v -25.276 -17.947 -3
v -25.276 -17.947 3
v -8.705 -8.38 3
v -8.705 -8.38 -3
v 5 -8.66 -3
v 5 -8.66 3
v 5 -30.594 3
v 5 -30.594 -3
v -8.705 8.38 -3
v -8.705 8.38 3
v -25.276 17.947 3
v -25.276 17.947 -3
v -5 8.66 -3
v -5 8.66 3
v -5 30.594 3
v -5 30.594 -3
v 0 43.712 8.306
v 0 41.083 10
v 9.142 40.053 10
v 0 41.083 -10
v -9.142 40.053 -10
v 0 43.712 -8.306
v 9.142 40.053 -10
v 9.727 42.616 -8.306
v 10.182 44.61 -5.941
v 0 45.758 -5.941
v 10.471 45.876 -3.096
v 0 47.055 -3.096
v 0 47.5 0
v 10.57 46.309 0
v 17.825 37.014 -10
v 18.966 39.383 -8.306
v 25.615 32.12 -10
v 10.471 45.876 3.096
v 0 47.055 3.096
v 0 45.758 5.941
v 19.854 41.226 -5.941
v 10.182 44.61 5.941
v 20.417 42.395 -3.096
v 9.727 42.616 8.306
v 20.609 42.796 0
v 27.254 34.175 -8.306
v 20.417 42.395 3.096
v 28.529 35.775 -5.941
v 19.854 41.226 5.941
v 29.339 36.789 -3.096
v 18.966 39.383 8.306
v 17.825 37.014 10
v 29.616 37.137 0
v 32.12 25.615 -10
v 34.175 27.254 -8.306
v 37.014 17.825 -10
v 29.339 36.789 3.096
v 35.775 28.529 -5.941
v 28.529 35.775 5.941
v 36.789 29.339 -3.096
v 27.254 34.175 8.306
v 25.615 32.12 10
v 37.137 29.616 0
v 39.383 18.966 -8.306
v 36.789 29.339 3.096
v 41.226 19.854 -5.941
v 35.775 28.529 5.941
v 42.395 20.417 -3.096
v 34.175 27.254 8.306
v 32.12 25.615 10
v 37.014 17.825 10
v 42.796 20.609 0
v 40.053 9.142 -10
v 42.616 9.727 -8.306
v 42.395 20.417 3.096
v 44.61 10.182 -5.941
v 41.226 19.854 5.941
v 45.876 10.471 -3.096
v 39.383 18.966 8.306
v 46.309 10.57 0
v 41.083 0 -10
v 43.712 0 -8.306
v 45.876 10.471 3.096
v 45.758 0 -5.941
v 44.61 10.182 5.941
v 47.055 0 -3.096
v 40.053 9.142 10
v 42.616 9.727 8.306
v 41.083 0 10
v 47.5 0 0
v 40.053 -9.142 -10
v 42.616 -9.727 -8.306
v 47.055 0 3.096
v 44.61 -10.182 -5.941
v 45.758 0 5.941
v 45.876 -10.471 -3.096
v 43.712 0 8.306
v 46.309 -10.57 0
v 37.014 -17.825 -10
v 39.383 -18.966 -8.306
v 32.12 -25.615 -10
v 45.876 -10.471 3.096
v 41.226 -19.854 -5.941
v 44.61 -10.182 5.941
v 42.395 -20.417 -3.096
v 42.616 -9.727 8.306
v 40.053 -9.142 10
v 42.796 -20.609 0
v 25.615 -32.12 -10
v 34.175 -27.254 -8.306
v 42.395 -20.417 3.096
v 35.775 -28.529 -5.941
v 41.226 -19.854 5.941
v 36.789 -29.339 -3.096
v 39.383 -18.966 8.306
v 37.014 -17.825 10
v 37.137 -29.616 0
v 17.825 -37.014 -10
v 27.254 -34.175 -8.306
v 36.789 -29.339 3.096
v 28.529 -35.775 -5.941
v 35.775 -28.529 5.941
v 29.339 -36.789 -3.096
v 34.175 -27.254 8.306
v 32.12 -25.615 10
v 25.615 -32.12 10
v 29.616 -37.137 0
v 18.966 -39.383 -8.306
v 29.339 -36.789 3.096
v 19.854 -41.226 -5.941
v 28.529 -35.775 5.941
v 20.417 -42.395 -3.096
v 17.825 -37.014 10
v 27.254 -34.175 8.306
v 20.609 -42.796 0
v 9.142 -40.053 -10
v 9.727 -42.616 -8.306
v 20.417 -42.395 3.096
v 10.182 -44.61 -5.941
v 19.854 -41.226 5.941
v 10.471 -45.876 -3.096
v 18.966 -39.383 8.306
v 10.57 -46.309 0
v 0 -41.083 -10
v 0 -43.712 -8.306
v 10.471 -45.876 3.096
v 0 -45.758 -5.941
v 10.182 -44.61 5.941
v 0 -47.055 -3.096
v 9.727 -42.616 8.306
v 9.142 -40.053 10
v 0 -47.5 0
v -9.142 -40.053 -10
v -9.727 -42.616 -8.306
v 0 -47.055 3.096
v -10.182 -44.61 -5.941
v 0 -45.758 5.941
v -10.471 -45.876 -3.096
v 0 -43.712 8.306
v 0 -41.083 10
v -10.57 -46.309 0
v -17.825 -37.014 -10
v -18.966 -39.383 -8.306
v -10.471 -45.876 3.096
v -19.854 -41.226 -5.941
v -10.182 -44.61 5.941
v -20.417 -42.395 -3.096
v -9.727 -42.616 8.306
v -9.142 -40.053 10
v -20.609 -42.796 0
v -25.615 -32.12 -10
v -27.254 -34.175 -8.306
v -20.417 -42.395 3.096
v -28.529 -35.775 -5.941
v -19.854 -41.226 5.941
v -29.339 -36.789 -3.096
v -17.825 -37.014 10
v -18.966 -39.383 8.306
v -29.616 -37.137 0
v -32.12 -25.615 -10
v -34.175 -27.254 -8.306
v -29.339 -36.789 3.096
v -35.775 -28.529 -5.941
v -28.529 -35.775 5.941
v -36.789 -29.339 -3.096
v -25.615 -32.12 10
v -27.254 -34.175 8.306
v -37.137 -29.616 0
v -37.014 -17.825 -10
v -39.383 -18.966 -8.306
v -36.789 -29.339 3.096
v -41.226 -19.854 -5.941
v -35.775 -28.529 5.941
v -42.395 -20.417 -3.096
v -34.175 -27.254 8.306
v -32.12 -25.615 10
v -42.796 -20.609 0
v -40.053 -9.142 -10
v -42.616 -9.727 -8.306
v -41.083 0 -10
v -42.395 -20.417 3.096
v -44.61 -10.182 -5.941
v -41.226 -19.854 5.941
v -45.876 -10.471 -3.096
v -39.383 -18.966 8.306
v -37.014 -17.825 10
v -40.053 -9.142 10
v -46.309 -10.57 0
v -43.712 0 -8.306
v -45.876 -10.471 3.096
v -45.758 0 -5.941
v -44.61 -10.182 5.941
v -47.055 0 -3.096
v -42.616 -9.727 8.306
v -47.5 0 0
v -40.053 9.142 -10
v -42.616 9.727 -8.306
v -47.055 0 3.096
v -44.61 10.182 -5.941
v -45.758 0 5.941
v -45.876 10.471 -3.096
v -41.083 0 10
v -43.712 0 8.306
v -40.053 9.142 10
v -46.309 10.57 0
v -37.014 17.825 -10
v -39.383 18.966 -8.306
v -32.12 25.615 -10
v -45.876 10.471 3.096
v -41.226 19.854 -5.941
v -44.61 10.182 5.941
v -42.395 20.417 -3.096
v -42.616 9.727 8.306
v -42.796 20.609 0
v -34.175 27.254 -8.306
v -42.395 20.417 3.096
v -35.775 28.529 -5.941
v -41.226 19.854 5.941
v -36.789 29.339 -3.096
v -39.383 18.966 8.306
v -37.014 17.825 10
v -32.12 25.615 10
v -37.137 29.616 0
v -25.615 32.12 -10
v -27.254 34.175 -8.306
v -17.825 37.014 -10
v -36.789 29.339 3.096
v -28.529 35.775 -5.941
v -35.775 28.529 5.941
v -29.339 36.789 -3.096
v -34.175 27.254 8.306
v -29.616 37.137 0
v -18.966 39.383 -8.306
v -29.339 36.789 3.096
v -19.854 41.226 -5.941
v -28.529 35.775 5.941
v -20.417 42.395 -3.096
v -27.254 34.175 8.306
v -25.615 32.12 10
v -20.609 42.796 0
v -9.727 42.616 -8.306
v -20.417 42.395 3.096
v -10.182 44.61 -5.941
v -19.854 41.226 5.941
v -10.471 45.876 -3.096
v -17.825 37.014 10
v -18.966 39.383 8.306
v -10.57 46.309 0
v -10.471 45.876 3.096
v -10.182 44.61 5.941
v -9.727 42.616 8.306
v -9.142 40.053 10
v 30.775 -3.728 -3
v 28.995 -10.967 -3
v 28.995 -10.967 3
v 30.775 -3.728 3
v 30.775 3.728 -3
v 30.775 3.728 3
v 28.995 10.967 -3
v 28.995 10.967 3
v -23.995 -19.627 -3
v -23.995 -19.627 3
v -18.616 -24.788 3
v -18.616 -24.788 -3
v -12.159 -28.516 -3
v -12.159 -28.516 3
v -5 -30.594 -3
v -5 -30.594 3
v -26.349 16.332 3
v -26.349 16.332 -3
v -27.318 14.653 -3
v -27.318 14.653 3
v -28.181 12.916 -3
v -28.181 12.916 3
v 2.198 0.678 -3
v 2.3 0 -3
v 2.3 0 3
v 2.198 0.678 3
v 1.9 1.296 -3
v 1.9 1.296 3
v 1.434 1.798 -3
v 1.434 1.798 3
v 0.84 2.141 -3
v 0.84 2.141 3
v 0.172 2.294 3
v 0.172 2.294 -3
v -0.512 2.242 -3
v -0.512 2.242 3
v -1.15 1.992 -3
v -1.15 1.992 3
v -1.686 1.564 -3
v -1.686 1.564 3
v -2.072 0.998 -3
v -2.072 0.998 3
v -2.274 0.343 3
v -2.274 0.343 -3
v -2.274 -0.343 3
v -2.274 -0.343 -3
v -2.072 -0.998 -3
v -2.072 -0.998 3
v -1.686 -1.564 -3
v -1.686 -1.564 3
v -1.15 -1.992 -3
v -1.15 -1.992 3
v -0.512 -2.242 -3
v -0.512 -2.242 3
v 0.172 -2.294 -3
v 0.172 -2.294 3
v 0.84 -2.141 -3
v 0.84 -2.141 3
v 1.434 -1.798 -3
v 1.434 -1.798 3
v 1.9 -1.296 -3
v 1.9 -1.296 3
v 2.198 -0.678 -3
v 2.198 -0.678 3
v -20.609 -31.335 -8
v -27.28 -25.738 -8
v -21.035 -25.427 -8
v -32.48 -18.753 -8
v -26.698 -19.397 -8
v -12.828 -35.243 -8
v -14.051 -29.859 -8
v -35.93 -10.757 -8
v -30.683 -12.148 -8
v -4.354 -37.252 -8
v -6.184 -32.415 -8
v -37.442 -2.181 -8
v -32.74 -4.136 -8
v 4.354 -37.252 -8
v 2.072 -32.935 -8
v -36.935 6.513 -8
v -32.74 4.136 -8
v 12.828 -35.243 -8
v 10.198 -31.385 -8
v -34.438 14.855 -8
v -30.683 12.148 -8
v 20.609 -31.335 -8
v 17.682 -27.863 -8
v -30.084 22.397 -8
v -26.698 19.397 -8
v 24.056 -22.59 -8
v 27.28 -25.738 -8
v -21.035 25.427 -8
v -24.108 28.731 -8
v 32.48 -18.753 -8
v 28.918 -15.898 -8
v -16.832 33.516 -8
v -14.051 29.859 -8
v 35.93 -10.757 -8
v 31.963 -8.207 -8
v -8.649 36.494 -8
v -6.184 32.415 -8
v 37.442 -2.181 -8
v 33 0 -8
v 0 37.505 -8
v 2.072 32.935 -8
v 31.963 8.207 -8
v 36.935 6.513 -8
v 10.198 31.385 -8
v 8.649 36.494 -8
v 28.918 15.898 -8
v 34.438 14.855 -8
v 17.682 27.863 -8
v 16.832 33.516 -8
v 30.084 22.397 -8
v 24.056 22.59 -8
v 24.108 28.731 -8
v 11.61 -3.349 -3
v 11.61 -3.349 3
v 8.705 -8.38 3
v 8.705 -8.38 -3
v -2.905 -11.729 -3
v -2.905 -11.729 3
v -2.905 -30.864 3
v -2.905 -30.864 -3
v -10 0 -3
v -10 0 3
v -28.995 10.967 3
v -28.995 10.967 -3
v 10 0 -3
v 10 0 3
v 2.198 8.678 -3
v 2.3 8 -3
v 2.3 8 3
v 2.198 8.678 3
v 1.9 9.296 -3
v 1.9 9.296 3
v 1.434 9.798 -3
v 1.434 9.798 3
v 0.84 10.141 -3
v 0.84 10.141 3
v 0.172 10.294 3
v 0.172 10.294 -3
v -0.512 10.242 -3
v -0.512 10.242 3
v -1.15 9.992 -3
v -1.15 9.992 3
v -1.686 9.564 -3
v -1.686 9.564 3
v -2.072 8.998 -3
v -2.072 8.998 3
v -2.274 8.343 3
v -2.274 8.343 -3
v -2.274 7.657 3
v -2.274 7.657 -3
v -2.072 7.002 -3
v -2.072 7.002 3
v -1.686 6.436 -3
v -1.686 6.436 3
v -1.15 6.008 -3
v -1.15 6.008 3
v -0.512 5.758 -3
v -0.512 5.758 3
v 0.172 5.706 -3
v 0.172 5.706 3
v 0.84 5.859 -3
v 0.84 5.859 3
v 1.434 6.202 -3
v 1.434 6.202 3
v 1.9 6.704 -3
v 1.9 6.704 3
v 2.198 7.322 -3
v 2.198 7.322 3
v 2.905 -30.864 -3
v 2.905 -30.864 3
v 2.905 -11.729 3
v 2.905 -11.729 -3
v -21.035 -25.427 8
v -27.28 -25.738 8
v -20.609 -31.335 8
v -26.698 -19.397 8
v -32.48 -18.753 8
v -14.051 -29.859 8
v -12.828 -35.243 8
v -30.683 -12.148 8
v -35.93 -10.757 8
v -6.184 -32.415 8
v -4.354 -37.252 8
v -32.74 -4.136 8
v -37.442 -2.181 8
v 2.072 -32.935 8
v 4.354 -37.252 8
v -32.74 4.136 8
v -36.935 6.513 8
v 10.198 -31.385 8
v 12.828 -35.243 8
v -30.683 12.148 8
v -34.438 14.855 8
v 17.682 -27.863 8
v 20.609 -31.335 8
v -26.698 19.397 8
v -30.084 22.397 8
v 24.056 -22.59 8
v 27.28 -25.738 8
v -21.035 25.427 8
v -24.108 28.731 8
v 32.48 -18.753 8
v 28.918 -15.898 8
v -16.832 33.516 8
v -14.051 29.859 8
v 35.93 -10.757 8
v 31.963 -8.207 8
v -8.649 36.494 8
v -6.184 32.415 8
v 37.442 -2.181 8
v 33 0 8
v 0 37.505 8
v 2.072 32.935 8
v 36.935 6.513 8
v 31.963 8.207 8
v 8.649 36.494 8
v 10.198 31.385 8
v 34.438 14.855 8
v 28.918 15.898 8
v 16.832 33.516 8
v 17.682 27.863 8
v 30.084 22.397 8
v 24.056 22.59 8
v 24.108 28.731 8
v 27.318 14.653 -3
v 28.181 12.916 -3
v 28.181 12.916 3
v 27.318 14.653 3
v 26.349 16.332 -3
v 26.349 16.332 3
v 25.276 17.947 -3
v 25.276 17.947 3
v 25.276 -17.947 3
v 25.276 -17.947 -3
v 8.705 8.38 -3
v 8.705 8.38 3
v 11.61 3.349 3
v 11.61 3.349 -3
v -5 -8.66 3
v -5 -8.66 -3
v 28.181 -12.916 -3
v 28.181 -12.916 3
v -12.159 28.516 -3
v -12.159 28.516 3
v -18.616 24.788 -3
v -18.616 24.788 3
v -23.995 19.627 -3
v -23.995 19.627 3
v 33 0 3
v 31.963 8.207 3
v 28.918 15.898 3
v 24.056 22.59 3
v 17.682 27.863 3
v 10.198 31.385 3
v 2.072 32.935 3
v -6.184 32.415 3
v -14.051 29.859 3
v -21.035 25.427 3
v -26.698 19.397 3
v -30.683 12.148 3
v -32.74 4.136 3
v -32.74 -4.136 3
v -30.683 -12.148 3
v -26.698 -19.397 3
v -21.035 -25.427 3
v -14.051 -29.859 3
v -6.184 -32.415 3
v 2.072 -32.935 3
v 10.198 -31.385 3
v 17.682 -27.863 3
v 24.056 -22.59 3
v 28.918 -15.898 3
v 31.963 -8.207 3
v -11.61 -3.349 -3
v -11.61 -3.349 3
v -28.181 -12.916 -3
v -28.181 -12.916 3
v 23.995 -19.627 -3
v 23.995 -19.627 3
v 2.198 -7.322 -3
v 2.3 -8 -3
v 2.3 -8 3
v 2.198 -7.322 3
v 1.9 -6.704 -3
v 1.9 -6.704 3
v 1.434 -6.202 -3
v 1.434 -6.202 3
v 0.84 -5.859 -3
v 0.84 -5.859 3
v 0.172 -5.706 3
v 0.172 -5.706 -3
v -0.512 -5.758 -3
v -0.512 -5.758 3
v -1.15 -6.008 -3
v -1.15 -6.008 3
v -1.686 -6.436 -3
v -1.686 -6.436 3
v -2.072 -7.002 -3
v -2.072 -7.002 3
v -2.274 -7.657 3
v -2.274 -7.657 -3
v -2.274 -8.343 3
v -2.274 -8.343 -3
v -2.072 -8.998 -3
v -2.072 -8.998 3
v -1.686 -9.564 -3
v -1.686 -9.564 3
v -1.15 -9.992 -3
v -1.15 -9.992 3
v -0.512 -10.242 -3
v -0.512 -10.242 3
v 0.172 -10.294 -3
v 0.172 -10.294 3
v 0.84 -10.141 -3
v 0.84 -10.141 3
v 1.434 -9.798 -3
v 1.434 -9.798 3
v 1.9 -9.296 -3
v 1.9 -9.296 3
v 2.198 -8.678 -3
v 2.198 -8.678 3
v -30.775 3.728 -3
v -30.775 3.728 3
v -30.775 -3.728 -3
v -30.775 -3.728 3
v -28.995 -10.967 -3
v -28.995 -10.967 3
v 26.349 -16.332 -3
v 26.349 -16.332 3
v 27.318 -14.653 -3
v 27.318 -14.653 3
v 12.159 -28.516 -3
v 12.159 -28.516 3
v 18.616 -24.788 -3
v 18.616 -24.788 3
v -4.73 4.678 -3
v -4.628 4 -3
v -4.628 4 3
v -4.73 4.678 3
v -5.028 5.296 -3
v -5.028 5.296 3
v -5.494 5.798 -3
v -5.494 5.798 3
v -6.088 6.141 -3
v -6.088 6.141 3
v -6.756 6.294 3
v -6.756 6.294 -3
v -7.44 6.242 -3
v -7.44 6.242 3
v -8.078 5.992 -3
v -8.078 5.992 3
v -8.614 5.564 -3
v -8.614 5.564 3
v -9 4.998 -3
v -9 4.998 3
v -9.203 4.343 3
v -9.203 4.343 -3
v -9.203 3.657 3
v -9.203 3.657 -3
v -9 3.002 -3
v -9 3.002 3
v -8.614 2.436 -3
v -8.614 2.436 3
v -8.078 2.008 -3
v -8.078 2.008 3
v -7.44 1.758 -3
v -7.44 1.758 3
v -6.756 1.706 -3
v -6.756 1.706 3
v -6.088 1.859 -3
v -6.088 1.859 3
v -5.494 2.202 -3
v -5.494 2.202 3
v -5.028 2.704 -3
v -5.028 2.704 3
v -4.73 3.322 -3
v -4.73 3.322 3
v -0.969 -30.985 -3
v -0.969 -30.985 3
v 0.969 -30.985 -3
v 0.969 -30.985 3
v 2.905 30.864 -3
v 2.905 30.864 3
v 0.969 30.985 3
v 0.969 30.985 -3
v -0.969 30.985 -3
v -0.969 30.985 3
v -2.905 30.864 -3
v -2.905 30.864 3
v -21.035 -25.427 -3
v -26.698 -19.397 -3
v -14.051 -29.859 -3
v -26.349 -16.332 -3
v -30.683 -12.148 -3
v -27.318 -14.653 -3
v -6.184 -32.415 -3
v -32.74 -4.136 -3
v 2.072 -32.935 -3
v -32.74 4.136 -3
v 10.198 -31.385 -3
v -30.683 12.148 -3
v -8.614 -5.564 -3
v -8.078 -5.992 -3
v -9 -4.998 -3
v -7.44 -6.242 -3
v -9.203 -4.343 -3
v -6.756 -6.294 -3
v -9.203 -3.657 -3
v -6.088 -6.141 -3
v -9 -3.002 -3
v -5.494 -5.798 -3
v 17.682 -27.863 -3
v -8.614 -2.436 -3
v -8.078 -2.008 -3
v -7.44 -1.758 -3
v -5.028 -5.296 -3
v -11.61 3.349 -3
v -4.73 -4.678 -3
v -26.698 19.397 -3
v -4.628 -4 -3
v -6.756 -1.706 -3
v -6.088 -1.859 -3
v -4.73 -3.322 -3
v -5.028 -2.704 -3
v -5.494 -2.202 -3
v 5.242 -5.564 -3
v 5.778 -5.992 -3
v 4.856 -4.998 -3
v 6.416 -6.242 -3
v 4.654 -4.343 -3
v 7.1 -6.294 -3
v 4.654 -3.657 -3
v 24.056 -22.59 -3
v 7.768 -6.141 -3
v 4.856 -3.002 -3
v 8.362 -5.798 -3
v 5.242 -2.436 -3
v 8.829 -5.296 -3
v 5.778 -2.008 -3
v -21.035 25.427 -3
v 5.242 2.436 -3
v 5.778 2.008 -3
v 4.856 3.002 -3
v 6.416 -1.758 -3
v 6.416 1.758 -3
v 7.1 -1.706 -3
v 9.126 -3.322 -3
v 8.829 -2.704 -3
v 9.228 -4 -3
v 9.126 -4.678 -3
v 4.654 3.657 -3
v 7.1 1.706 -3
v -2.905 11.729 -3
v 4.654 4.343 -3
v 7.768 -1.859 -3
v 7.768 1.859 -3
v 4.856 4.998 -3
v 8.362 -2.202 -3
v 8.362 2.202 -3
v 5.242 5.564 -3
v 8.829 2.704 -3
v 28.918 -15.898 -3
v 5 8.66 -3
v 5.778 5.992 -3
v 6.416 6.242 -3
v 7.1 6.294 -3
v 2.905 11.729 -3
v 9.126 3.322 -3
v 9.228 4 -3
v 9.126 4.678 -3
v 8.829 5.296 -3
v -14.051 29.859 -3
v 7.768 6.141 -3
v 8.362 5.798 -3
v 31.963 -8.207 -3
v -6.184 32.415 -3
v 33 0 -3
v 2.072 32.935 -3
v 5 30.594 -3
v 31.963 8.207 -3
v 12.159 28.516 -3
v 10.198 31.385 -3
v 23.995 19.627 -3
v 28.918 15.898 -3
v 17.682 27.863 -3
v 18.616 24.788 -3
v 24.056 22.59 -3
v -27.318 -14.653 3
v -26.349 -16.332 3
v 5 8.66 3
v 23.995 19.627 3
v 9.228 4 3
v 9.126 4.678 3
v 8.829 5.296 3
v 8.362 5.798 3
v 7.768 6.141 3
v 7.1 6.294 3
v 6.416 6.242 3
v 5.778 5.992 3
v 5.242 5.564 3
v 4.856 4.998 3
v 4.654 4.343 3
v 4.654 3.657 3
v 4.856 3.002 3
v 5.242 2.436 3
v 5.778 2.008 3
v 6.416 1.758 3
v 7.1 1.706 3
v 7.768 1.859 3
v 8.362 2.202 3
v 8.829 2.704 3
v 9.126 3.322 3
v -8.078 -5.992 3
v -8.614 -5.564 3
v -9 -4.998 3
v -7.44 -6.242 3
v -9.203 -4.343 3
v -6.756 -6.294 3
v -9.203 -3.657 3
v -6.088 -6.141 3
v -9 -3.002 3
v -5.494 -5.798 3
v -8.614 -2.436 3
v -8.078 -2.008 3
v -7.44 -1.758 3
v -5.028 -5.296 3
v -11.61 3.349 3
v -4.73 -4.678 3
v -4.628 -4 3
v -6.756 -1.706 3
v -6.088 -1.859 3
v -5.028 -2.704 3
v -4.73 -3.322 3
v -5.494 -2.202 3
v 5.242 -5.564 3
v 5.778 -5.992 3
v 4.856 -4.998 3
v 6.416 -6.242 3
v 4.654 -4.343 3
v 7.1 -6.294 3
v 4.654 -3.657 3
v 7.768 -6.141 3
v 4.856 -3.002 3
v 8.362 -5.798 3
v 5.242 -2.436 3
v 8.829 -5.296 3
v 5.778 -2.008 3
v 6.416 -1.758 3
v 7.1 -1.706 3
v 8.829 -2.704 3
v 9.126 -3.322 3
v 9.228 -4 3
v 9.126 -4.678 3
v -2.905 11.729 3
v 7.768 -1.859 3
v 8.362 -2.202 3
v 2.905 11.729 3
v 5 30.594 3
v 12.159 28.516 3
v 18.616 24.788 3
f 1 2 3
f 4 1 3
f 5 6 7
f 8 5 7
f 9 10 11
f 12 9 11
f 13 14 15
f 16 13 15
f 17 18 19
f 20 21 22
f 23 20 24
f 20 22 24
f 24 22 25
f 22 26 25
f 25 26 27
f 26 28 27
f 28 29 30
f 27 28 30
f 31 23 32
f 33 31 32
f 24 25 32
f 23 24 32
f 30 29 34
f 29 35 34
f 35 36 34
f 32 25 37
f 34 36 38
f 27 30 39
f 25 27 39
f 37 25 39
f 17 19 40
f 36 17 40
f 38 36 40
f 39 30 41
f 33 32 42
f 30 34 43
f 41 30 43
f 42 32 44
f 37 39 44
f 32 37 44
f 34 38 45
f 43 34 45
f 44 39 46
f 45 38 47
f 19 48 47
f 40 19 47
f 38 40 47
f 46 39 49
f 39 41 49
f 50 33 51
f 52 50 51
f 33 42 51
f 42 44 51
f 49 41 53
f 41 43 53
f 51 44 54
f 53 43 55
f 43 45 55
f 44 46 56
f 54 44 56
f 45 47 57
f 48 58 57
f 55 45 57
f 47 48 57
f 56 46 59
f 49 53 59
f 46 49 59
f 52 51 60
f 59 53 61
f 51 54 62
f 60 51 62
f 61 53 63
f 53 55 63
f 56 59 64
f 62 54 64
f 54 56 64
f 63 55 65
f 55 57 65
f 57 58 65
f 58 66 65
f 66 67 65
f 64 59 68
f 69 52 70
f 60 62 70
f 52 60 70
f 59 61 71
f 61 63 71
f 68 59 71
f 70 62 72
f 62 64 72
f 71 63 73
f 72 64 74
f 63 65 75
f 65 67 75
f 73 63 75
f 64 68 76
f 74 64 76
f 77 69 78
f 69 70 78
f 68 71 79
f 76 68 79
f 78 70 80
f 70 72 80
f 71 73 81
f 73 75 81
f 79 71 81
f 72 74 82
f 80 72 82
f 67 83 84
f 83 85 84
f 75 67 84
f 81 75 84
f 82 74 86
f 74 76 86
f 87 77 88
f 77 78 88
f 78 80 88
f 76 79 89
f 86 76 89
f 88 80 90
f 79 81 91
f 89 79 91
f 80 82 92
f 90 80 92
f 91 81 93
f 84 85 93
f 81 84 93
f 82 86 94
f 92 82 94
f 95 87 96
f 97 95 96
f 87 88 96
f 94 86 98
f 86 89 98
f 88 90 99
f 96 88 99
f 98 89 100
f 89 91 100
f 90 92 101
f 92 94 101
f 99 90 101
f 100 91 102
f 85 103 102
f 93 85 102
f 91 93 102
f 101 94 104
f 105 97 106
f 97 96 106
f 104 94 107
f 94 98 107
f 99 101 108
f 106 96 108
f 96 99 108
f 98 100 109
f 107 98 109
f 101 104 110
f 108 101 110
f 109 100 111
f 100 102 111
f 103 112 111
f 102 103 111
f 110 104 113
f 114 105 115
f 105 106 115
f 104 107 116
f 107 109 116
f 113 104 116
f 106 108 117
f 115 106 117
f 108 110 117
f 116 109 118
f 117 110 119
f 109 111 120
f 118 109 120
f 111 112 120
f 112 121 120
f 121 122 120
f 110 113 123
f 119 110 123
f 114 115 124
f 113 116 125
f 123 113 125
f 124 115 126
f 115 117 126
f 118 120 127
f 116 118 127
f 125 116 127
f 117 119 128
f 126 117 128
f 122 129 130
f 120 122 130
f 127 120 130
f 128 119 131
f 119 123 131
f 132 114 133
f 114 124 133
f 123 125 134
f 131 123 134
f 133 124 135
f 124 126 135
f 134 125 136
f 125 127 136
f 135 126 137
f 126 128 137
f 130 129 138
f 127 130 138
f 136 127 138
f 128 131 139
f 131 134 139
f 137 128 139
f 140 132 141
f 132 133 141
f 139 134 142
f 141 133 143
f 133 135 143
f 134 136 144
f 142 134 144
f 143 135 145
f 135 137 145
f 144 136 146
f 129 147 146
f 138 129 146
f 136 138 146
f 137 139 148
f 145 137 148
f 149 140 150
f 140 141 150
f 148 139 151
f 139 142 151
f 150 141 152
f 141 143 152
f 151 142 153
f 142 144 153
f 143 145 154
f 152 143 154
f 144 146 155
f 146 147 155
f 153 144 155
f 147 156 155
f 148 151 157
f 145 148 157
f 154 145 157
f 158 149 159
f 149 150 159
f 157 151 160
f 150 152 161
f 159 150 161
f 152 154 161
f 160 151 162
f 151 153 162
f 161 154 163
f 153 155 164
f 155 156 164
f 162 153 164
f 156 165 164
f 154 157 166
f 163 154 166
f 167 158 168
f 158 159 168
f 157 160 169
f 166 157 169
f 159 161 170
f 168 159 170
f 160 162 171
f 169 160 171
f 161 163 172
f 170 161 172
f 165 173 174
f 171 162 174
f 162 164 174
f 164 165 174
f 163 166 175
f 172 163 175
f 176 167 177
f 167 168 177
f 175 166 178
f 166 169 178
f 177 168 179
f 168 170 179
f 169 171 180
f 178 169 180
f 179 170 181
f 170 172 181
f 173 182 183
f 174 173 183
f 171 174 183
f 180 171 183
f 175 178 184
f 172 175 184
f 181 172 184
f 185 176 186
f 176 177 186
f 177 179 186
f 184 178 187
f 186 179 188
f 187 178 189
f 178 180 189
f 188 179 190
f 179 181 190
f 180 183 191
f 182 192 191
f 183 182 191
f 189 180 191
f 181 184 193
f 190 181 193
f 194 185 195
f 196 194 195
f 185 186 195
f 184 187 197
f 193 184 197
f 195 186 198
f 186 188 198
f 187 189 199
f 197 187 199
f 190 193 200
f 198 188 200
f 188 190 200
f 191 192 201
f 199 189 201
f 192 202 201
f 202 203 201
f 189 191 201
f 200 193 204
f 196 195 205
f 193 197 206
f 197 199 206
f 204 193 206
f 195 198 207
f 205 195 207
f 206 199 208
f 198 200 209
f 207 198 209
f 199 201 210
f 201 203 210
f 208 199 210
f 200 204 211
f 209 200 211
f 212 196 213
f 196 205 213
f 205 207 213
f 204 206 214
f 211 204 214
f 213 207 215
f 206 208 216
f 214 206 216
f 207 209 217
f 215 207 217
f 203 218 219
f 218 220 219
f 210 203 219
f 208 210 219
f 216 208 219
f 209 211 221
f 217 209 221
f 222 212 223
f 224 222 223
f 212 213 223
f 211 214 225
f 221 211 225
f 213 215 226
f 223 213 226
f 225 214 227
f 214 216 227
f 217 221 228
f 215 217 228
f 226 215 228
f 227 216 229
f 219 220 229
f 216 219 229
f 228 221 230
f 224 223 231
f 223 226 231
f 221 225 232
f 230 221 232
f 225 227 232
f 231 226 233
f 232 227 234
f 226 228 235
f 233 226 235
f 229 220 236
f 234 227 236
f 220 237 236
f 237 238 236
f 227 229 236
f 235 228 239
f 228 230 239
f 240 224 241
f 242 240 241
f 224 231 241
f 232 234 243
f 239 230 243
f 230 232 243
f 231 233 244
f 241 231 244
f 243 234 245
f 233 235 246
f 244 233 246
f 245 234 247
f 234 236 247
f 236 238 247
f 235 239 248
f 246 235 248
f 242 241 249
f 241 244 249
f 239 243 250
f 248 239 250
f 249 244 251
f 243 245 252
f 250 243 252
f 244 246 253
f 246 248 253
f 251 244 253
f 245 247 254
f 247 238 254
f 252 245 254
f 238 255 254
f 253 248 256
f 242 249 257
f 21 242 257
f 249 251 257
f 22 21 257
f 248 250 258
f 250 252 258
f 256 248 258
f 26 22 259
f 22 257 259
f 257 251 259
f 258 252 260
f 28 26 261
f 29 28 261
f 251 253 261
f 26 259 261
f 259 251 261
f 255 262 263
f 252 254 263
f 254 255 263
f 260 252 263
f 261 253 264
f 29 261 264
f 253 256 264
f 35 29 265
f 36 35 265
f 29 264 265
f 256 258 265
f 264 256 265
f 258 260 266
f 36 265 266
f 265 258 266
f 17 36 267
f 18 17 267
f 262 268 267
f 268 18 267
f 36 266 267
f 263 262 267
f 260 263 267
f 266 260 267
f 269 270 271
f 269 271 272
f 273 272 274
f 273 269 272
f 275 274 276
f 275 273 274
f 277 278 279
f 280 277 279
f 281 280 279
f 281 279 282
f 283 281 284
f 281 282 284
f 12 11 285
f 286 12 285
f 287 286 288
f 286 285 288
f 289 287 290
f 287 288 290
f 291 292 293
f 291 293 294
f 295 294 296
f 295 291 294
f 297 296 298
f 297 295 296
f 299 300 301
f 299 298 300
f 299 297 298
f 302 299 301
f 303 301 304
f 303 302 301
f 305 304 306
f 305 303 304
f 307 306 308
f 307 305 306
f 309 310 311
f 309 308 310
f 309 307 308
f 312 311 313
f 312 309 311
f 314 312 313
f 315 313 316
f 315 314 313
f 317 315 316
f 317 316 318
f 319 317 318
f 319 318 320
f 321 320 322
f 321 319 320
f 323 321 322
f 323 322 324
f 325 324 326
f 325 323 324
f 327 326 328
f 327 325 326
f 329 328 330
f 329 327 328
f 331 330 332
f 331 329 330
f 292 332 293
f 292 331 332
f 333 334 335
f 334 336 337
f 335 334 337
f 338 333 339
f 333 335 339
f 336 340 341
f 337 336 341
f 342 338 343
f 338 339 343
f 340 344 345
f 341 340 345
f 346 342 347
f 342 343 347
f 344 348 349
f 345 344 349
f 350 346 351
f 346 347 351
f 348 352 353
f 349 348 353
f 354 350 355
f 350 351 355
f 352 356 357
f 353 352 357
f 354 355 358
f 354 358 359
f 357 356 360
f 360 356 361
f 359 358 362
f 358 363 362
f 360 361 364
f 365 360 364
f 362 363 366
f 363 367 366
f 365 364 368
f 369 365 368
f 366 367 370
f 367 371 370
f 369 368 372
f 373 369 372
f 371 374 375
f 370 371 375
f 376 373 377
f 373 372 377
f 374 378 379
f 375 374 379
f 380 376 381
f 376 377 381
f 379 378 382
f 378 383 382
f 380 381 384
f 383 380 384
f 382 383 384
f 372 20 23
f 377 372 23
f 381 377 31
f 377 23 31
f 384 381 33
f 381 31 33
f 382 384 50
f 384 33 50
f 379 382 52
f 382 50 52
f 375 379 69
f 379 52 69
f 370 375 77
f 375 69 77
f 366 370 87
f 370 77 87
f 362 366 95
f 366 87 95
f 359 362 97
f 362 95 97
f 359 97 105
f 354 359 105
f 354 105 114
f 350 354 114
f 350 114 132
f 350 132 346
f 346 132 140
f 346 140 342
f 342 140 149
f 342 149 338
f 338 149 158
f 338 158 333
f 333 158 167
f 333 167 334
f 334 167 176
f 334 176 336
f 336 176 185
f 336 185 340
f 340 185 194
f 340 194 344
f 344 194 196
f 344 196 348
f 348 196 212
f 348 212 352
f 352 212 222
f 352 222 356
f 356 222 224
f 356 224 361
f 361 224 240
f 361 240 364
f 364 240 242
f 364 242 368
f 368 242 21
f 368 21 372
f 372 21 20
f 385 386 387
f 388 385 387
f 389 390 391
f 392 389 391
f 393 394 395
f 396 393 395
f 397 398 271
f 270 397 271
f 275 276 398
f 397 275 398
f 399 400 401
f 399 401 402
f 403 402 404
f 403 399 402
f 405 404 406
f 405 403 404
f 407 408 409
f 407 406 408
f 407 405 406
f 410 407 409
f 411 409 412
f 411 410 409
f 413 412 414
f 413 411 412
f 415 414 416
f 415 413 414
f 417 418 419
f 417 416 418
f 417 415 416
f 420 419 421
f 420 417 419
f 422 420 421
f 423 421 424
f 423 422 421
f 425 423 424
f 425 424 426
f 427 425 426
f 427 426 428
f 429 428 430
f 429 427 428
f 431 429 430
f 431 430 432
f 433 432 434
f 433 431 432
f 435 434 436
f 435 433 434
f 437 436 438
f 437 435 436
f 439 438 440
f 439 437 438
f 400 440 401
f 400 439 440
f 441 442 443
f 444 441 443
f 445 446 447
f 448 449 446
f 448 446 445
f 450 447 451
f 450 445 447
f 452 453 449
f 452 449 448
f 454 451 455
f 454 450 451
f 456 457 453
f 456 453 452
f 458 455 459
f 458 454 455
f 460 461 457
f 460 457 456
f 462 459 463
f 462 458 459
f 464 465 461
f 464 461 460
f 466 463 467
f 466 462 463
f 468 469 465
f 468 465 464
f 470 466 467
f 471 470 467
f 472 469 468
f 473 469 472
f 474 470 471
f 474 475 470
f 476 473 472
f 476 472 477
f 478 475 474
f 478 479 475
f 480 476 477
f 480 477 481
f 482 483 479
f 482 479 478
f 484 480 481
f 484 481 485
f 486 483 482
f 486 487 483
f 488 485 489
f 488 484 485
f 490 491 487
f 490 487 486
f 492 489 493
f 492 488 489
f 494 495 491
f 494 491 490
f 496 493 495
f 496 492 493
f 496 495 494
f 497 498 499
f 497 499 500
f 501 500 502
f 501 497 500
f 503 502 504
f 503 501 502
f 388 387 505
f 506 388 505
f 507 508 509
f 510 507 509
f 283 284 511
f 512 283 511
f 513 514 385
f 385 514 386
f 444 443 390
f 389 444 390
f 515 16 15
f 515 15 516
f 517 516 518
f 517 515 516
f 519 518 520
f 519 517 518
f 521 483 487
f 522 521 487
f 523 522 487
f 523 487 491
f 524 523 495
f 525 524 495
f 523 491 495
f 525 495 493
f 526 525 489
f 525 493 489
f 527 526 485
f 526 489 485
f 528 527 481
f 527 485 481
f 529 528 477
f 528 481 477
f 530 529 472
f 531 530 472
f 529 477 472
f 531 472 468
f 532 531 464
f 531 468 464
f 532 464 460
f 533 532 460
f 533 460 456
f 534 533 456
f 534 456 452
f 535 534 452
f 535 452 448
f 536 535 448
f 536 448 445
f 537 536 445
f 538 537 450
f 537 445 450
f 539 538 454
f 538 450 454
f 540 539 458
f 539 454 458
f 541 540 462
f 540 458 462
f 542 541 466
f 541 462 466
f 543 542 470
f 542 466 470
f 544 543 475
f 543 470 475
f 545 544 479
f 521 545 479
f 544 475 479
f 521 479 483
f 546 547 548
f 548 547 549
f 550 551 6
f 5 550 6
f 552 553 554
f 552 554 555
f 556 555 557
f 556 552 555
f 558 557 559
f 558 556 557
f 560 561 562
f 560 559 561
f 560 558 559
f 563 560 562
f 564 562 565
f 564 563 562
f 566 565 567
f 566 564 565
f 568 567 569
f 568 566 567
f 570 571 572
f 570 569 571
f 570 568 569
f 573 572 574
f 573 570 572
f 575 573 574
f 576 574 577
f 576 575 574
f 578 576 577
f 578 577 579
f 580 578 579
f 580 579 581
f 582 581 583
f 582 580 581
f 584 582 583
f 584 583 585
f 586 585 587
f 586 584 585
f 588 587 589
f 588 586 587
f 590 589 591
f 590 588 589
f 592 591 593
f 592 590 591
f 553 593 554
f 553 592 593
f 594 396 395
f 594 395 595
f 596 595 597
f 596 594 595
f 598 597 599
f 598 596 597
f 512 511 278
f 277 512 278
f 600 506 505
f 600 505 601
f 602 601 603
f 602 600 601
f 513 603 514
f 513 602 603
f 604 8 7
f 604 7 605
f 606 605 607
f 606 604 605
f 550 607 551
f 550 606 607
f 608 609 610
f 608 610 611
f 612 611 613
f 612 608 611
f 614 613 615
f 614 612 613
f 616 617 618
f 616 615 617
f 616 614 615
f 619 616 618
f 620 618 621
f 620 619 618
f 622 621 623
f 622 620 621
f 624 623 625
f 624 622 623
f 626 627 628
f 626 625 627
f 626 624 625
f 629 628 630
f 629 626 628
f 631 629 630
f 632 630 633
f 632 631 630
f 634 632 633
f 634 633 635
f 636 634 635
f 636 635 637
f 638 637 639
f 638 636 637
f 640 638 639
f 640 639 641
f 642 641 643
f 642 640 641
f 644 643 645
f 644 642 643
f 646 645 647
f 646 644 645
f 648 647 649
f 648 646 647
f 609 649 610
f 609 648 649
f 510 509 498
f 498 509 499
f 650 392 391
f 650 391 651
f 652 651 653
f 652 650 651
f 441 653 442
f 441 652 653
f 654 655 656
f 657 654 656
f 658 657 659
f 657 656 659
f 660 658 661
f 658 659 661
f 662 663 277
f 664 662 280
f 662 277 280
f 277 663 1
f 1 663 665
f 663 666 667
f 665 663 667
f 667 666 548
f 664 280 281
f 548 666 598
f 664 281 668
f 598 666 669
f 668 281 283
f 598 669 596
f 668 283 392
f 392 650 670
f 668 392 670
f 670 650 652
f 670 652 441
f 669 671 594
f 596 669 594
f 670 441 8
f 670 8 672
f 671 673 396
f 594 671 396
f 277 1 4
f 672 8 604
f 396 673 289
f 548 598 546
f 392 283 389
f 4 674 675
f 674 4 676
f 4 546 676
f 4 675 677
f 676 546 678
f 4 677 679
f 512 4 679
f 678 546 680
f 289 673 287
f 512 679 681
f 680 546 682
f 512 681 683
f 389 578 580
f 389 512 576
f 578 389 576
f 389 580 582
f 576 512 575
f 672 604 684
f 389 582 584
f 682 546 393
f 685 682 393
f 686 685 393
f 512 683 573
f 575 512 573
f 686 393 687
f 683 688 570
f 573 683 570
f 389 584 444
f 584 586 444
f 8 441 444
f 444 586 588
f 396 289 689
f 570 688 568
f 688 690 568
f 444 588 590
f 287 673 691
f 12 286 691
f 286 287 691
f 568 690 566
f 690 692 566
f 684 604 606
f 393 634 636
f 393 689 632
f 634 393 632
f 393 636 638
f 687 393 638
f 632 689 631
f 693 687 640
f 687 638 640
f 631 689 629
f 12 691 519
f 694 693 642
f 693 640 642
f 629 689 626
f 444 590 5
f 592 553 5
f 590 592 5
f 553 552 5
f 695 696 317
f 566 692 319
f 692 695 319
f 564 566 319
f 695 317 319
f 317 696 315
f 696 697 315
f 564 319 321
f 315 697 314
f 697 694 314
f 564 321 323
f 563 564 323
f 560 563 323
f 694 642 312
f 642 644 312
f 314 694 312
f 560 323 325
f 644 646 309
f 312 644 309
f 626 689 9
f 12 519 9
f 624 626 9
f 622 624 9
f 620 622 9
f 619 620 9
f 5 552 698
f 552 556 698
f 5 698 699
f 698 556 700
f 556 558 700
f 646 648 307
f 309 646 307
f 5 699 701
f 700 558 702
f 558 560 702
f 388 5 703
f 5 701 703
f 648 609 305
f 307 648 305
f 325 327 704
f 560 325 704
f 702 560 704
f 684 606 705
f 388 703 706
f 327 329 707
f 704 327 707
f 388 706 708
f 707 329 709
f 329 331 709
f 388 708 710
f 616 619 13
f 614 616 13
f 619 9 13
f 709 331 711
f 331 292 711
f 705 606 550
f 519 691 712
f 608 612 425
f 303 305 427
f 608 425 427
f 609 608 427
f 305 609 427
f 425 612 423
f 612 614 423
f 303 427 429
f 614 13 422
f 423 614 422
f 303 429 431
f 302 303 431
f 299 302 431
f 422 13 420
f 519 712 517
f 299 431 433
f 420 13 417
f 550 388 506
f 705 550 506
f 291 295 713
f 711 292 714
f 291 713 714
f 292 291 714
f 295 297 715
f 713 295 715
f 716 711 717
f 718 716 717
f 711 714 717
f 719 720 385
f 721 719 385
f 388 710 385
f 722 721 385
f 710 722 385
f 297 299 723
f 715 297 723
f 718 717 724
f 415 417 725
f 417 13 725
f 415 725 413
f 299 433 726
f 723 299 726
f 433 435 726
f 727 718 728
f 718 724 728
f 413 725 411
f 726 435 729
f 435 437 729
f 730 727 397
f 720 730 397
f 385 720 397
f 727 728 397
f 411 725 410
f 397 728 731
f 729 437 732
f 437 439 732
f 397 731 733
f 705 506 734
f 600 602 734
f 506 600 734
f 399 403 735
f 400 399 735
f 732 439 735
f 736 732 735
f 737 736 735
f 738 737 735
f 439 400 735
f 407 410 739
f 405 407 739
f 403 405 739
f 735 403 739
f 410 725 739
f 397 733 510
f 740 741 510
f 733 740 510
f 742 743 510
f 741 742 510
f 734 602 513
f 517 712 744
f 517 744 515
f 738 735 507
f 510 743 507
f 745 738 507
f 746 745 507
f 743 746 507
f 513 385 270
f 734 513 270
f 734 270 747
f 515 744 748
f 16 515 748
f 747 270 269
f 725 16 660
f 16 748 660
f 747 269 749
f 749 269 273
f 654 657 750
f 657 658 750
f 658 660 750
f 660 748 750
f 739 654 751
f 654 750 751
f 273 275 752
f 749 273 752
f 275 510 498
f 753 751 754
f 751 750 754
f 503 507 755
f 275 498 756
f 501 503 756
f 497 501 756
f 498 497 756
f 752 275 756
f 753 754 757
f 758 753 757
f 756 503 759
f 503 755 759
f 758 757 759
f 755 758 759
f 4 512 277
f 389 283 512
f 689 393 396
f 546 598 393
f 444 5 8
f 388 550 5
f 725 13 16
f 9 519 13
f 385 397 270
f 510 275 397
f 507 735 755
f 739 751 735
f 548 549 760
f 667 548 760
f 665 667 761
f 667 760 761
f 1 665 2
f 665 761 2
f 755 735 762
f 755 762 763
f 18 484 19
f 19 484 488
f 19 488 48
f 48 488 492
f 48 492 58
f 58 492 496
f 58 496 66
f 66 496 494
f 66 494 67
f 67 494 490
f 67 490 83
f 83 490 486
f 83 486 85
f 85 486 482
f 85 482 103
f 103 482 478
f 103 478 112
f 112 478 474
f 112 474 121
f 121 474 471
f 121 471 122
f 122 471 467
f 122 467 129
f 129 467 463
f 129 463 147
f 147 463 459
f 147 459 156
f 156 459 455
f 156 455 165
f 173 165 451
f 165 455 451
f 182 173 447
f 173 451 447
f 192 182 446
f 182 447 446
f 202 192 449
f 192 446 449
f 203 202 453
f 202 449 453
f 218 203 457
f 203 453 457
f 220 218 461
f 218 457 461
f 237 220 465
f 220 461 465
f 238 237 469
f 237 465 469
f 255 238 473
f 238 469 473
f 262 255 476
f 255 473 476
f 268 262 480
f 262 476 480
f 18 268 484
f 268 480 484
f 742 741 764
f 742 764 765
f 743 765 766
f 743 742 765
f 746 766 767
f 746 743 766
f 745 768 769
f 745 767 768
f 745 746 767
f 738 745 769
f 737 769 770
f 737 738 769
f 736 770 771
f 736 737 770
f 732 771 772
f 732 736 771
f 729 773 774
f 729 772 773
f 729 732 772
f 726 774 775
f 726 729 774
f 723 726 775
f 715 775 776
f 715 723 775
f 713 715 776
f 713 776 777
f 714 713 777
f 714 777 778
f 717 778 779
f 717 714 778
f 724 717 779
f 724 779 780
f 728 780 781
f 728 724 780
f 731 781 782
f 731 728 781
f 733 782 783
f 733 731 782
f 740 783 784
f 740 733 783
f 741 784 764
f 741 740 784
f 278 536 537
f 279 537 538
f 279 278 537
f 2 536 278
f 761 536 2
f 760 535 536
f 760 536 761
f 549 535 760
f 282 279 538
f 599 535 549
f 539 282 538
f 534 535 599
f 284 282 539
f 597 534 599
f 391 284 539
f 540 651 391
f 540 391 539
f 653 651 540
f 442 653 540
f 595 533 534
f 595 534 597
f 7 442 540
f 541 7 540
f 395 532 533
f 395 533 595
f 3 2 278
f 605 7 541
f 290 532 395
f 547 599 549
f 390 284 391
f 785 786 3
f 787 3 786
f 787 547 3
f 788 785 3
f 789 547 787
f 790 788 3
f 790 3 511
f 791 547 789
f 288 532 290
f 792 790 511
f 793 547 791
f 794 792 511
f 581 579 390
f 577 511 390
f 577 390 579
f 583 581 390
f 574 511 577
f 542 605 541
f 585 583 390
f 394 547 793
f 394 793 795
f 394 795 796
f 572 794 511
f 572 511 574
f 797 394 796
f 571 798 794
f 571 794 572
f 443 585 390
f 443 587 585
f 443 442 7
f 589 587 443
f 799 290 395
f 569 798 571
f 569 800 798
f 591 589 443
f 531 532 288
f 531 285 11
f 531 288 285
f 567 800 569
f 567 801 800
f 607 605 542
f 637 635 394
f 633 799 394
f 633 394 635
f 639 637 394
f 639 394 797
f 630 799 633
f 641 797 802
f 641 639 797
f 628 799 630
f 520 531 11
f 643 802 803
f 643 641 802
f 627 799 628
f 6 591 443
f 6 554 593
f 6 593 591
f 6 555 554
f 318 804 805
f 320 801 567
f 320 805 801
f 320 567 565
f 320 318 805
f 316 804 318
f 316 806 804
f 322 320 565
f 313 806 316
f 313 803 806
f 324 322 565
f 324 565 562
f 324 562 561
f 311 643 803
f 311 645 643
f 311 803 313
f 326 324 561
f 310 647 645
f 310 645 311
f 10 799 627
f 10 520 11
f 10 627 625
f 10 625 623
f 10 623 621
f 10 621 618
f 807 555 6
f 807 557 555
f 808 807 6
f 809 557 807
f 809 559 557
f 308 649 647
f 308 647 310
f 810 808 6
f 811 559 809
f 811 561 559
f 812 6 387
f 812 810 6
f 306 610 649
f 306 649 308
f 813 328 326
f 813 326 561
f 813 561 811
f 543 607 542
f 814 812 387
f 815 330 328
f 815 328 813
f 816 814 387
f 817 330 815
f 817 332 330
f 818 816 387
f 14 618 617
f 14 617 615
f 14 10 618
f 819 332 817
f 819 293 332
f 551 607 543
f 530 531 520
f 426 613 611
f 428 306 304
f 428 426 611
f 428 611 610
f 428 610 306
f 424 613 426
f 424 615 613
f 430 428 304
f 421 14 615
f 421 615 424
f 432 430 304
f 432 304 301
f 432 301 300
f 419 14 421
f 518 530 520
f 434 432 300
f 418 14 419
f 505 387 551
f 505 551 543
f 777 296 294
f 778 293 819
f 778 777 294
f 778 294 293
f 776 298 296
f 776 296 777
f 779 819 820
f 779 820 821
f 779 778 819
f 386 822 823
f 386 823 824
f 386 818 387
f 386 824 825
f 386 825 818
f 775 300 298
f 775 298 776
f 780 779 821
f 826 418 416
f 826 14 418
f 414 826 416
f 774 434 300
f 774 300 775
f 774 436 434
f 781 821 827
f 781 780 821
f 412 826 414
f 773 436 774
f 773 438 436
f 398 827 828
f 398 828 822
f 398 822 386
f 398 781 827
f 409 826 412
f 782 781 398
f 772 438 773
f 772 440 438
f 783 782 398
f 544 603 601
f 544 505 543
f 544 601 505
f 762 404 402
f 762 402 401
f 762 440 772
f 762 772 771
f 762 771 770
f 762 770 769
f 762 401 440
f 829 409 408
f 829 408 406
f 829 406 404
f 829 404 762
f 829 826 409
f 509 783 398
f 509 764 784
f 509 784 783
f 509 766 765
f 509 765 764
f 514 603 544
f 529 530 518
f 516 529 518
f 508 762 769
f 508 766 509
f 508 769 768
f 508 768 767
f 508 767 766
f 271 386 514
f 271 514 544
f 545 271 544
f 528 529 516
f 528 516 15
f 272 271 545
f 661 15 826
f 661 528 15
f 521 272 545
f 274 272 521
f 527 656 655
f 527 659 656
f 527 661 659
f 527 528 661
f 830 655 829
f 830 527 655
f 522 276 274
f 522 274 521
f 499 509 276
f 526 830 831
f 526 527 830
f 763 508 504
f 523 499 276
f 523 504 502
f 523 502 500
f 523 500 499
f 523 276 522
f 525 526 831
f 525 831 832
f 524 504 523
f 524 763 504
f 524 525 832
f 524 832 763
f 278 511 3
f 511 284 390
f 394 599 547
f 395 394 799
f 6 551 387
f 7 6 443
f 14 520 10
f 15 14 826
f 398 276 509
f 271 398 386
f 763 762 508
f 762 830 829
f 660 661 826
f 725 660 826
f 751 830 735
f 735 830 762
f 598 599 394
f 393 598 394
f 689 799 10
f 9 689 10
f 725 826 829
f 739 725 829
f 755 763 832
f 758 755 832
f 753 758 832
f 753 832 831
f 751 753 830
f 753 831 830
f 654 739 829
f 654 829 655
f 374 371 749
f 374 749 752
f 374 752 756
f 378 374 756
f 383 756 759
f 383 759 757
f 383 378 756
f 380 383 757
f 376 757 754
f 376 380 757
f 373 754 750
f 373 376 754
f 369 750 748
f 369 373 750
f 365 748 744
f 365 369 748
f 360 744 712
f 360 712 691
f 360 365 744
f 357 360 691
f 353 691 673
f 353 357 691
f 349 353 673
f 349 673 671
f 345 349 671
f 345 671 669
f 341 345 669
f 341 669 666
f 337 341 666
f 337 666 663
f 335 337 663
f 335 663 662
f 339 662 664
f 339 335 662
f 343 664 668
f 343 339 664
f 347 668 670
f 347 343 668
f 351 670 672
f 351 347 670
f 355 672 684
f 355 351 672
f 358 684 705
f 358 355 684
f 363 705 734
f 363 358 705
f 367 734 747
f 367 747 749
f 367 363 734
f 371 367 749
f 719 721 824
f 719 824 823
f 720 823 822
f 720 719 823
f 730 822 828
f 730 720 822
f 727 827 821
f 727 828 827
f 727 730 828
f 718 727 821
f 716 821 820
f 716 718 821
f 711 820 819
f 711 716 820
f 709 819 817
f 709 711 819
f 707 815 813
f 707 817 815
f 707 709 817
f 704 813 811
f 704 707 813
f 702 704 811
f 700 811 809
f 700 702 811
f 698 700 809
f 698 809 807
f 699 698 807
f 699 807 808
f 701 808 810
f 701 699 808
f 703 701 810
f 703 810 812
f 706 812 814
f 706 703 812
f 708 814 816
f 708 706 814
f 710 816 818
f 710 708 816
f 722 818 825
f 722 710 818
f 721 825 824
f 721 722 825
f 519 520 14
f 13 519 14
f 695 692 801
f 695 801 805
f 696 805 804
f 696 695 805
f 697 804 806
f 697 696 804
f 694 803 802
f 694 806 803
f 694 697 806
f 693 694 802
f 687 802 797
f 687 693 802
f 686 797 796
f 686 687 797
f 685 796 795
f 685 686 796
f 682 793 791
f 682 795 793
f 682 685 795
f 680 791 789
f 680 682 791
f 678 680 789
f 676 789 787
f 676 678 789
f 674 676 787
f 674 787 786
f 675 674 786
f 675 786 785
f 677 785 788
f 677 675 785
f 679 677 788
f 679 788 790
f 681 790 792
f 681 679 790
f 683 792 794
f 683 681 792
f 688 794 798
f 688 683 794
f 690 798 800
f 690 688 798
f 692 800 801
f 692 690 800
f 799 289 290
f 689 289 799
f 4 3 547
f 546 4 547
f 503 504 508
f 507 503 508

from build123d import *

# Parameters (mm, degrees)
SKETCH_2_R          = 37.505158637
SKETCH_2_R_2        = 2.3
EXTRUDE_2_DEPTH     = 8
SKETCH_3_R          = 33
CUT_EXTRUDE_1_DEPTH = 5
CUT_EXTRUDE_START   = -16
SKETCH_3_2_R        = 33
CUT_EXTRUDE_2_DEPTH = 5


with BuildPart() as part:
    # Sketch 1 → Revolve 1 (revolve)
    with BuildSketch(Plane(origin=(0, 0, 0), x_dir=(0, 0, -1), z_dir=(1, 0, 0))):
        with BuildLine():
            Line((-8, 37.505158637), (8, 37.505158637))
            Line((8, 37.505158637), (10, 41.082575695))
            ThreePointArc((10, 41.082575695), (0, 47.5), (-10, 41.082575695))
            Line((-10, 41.082575695), (-8, 37.505158637))
        make_face()
    revolve(axis=Axis((0, 0, 15.4), (0, 0, -1)))

    # Sketch 2 → Extrude 2 (add, symmetric)
    with BuildSketch(Plane.XY):
        Circle(SKETCH_2_R)
        Circle(SKETCH_2_R_2, mode=Mode.SUBTRACT)
        with Locations((0, 8)):
            Circle(SKETCH_2_R_2, mode=Mode.SUBTRACT)
        with Locations((6.92820323, 4)):
            Circle(SKETCH_2_R_2, mode=Mode.SUBTRACT)
        with Locations((6.92820323, -4)):
            Circle(SKETCH_2_R_2, mode=Mode.SUBTRACT)
        with Locations((0, -8)):
            Circle(SKETCH_2_R_2, mode=Mode.SUBTRACT)
        with Locations((-6.92820323, -4)):
            Circle(SKETCH_2_R_2, mode=Mode.SUBTRACT)
        with Locations((-6.92820323, 4)):
            Circle(SKETCH_2_R_2, mode=Mode.SUBTRACT)
        with BuildLine():
            Line((5, 30.594117082), (5, 8.660254038))
            Line((5, 8.660254038), (23.995282599, 19.62718556))
            ThreePointArc((23.995282599, 19.62718556), (15.5, 26.846787517), (5, 30.594117082))
        make_face(mode=Mode.SUBTRACT)
        with BuildLine():
            Line((10, 0), (28.995282599, -10.966931522))
            ThreePointArc((28.995282599, -10.966931522), (31, 0), (28.995282599, 10.966931522))
            Line((28.995282599, 10.966931522), (10, 0))
        make_face(mode=Mode.SUBTRACT)
        with BuildLine():
            Line((5, -8.660254038), (5, -30.594117082))
            ThreePointArc((5, -30.594117082), (15.5, -26.846787517), (23.995282599, -19.62718556))
            Line((23.995282599, -19.62718556), (5, -8.660254038))
        make_face(mode=Mode.SUBTRACT)
        with BuildLine():
            Line((-5, -8.660254038), (-23.995282599, -19.62718556))
            ThreePointArc((-23.995282599, -19.62718556), (-15.5, -26.846787517), (-5, -30.594117082))
            Line((-5, -30.594117082), (-5, -8.660254038))
        make_face(mode=Mode.SUBTRACT)
        with BuildLine():
            Line((-10, 0), (-28.995282599, 10.966931522))
            ThreePointArc((-28.995282599, 10.966931522), (-31, 0), (-28.995282599, -10.966931522))
            Line((-28.995282599, -10.966931522), (-10, 0))
        make_face(mode=Mode.SUBTRACT)
        with BuildLine():
            Line((-5, 8.660254038), (-5, 30.594117082))
            ThreePointArc((-5, 30.594117082), (-15.5, 26.846787517), (-23.995282599, 19.62718556))
            Line((-23.995282599, 19.62718556), (-5, 8.660254038))
        make_face(mode=Mode.SUBTRACT)
        with BuildLine():
            Line((-2.90470199, 30.863614603), (-2.90470199, 11.729037589))
            Line((-2.90470199, 11.729037589), (2.90470199, 11.729037589))
            Line((2.90470199, 11.729037589), (2.90470199, 30.863614603))
            ThreePointArc((2.90470199, 30.863614603), (0, 31), (-2.90470199, 30.863614603))
        make_face(mode=Mode.SUBTRACT)
        with BuildLine():
            Line((8.705293519, 8.380064508), (11.609995509, 3.34897308))
            Line((11.609995509, 3.34897308), (28.181025294, 12.916261587))
            ThreePointArc((28.181025294, 12.916261587), (26.846787517, 15.5), (25.276323303, 17.947353015))
            Line((25.276323303, 17.947353015), (8.705293519, 8.380064508))
        make_face(mode=Mode.SUBTRACT)
        with BuildLine():
            Line((11.609995509, -3.34897308), (8.705293519, -8.380064508))
            Line((8.705293519, -8.380064508), (25.276323303, -17.947353015))
            ThreePointArc((25.276323303, -17.947353015), (26.846787517, -15.5), (28.181025294, -12.916261587))
            Line((28.181025294, -12.916261587), (11.609995509, -3.34897308))
        make_face(mode=Mode.SUBTRACT)
        with BuildLine():
            Line((2.90470199, -11.729037589), (-2.90470199, -11.729037589))
            Line((-2.90470199, -11.729037589), (-2.90470199, -30.863614603))
            ThreePointArc((-2.90470199, -30.863614603), (0, -31), (2.90470199, -30.863614603))
            Line((2.90470199, -30.863614603), (2.90470199, -11.729037589))
        make_face(mode=Mode.SUBTRACT)
        with BuildLine():
            Line((-8.705293519, -8.380064508), (-11.609995509, -3.34897308))
            Line((-11.609995509, -3.34897308), (-28.181025294, -12.916261587))
            ThreePointArc((-28.181025294, -12.916261587), (-26.846787517, -15.5), (-25.276323303, -17.947353015))
            Line((-25.276323303, -17.947353015), (-8.705293519, -8.380064508))
        make_face(mode=Mode.SUBTRACT)
        with BuildLine():
            Line((-11.609995509, 3.34897308), (-8.705293519, 8.380064508))
            Line((-8.705293519, 8.380064508), (-25.276323303, 17.947353015))
            ThreePointArc((-25.276323303, 17.947353015), (-26.846787517, 15.5), (-28.181025294, 12.916261587))
            Line((-28.181025294, 12.916261587), (-11.609995509, 3.34897308))
        make_face(mode=Mode.SUBTRACT)
    extrude(amount=EXTRUDE_2_DEPTH, both=True)

    # Sketch 3 → Cut-Extrude 1 (cut)
    with BuildSketch(Plane.XY.offset(8)):
        Circle(SKETCH_3_R)
    extrude(amount=-CUT_EXTRUDE_1_DEPTH, mode=Mode.SUBTRACT)

    # Sketch 3_2 → Cut-Extrude 2 (cut)
    with BuildSketch(Plane.XY.offset(8).offset(CUT_EXTRUDE_START)):
        Circle(SKETCH_3_2_R)
    extrude(amount=CUT_EXTRUDE_2_DEPTH, mode=Mode.SUBTRACT)


solid = part.part
